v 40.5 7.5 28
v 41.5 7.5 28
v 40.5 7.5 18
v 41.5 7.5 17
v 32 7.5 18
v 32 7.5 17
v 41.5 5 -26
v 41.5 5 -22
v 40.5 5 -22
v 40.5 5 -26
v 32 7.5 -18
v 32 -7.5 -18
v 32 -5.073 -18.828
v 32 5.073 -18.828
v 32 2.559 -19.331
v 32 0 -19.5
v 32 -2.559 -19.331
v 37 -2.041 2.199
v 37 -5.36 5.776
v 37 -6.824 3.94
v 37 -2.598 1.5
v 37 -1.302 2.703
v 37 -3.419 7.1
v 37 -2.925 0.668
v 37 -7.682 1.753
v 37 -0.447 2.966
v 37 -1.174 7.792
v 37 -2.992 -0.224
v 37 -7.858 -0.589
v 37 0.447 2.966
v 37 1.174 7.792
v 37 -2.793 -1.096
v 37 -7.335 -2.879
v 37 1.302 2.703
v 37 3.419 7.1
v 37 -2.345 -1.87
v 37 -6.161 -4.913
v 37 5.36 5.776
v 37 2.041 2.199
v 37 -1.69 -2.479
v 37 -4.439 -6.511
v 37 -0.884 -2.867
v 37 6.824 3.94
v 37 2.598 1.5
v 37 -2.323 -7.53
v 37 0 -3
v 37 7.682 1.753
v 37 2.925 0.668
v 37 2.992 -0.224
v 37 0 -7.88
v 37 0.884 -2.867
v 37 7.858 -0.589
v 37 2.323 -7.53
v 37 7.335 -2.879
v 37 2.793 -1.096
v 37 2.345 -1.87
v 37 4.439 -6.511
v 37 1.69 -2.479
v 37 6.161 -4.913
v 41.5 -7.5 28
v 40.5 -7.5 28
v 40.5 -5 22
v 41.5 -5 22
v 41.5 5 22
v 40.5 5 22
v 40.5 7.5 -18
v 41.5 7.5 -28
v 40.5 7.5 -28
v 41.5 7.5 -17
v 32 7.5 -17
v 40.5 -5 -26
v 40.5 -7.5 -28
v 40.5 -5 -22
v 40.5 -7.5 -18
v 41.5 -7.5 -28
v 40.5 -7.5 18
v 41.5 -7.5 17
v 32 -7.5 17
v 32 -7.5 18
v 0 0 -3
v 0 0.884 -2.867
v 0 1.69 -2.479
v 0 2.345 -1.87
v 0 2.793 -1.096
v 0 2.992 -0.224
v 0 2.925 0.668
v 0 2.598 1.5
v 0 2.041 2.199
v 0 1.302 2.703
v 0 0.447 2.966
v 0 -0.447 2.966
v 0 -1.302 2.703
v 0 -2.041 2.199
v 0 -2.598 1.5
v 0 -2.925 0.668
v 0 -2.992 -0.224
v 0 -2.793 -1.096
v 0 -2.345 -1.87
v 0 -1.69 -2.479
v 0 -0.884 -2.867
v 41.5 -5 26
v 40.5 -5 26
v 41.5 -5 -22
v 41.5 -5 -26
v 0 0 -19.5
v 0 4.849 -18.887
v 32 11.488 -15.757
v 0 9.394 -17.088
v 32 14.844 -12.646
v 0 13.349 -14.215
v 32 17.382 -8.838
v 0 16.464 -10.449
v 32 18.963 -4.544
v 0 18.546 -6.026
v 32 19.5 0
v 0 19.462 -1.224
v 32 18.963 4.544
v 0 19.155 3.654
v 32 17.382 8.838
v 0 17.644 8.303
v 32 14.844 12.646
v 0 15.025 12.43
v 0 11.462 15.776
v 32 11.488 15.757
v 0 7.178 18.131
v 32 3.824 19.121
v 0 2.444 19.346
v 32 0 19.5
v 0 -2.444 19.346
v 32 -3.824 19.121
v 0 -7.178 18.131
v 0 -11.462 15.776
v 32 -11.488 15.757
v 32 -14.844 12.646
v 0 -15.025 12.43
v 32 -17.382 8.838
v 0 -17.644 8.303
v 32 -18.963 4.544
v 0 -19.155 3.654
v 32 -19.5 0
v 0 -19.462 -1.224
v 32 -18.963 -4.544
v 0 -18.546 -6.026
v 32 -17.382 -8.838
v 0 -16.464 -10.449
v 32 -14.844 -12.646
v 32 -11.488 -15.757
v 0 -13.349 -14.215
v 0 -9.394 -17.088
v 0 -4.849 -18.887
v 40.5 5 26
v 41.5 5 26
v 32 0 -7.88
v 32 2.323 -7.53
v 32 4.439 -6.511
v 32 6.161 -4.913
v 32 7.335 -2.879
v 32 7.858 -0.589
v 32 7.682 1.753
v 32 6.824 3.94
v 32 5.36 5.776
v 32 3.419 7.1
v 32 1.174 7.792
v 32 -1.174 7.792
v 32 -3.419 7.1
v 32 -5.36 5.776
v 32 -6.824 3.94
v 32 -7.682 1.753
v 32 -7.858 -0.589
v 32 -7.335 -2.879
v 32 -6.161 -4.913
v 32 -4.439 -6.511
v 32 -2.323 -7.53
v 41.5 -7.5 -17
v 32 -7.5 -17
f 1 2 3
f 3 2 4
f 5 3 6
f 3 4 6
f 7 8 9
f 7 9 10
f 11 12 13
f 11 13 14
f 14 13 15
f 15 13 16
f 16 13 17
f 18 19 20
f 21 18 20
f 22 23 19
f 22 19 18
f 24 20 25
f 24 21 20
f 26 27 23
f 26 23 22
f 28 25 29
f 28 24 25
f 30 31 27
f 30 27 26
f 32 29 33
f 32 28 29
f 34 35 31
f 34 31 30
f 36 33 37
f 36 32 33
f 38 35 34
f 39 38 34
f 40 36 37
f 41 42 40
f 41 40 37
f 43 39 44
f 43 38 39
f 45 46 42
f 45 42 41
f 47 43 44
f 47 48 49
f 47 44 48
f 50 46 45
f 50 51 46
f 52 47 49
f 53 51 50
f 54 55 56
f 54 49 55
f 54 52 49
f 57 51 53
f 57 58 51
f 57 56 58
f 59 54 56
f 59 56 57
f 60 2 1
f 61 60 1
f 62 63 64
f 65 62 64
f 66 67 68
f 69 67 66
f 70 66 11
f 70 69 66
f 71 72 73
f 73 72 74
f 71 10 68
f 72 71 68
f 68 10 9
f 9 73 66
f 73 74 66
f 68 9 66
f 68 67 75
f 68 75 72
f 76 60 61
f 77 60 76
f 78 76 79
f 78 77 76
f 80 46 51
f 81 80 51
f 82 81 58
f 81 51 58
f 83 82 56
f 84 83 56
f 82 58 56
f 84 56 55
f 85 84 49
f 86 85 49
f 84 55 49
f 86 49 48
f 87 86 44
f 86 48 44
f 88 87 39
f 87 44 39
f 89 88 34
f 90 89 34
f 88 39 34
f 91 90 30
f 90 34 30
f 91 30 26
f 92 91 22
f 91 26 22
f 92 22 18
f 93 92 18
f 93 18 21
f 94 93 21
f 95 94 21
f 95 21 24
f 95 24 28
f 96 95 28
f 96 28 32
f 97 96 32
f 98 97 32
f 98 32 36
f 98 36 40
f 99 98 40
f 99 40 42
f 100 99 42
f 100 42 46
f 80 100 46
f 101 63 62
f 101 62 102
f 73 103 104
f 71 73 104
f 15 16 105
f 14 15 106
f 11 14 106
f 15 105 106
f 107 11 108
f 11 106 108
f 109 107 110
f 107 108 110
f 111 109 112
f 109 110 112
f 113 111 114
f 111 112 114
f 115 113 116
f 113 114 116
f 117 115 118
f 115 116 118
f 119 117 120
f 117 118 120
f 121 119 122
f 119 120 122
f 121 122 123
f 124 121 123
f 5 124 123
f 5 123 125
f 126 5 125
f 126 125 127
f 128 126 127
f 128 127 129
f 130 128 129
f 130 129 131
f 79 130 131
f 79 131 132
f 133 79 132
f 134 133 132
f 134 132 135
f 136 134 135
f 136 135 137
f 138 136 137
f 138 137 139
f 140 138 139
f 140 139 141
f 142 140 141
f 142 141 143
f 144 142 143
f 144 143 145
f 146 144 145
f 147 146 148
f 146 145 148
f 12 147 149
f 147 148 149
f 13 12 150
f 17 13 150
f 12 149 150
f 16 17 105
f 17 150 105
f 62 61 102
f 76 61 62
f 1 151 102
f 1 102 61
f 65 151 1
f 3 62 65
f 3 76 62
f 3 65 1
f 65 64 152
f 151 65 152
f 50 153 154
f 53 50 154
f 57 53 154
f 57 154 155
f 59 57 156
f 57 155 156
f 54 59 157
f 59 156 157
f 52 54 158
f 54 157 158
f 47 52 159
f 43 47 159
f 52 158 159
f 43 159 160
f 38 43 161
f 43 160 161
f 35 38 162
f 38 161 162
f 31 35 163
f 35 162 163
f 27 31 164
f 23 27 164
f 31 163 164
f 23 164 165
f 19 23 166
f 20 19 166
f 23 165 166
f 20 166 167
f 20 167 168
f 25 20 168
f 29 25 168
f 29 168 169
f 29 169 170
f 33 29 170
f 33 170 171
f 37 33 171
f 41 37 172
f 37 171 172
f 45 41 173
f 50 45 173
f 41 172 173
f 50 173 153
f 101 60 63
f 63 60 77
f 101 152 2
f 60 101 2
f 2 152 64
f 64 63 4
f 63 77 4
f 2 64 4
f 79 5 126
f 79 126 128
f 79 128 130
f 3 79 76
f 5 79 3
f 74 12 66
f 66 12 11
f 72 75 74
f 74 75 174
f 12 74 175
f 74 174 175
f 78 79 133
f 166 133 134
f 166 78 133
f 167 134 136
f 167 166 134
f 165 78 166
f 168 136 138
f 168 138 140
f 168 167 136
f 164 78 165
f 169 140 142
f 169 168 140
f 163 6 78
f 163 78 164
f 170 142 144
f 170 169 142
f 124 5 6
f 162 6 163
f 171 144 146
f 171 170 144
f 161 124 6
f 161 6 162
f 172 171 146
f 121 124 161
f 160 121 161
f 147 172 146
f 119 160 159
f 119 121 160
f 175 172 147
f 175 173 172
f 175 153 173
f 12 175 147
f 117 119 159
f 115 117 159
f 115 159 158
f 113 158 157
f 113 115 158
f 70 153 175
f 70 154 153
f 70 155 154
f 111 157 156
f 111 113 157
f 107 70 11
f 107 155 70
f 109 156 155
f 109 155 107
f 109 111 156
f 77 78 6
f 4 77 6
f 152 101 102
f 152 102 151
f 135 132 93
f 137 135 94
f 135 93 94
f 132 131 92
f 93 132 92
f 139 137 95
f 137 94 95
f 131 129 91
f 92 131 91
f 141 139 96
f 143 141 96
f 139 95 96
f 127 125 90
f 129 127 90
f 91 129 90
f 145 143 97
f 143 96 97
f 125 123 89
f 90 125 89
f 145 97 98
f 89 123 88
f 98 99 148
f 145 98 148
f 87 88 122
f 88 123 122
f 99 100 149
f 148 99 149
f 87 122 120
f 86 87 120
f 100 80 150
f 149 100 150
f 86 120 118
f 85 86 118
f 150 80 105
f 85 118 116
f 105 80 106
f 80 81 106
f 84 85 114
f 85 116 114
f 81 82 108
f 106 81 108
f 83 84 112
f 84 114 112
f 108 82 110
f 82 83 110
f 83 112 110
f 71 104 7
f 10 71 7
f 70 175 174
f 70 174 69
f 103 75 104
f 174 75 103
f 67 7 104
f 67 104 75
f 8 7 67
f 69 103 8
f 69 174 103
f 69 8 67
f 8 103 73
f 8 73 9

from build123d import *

# Parameters (mm, degrees)
SKETCH_1_R          = 19.5
EXTRUDE_1_DEPTH     = 32
SKETCH_2_R          = 7.88
EXTRUDE_2_DEPTH     = 5
CUT_EXTRUDE_1_REACH = 48.147
SKETCH_3_R          = 3
SKETCH_4_W          = 1
SKETCH_4_H          = 15
EXTRUDE_3_DEPTH     = 9.5
SKETCH_6_W          = 1
SKETCH_6_H          = 15
EXTRUDE_4_DEPTH     = 10
SKETCH_7_W          = 4
SKETCH_7_H          = 10
CUT_EXTRUDE_2_DEPTH = 10


with BuildPart() as part:
    # 草图1 → 凸台-拉伸1 (new body)
    with BuildSketch(Plane(origin=(0, 0, 0), x_dir=(0, 0, -1), z_dir=(1, 0, 0))):
        Circle(SKETCH_1_R)
    extrude(amount=EXTRUDE_1_DEPTH)

    # 草图2 → 凸台-拉伸2 (add)
    with BuildSketch(Plane(origin=(32, 0, 0), x_dir=(0, 0, -1), z_dir=(1, 0, 0))):
        Circle(SKETCH_2_R)
    extrude(amount=EXTRUDE_2_DEPTH)

    # 草图3 → 切除-拉伸1 (cut, up to next)
    with BuildSketch(Plane(origin=(37, 0, 0), x_dir=(0, 0, -1), z_dir=(1, 0, 0)), mode=Mode.PRIVATE) as cut_extrude_1_sk1:
        Circle(SKETCH_3_R)
    cut_extrude_1_tool1 = extrude(cut_extrude_1_sk1.sketch, amount=-CUT_EXTRUDE_1_REACH, mode=Mode.PRIVATE) & part.part
    add(cut_extrude_1_tool1.solids().sort_by_distance((37, 0, 0))[0], mode=Mode.SUBTRACT)

    # 草图4 → 凸台-拉伸3 (add)
    with BuildSketch(Plane(origin=(32, 0, 0), x_dir=(0, 0, -1), z_dir=(1, 0, 0))):
        with Locations((17.5, 0)):
            Rectangle(SKETCH_4_W, SKETCH_4_H)
    extrude_3 = extrude(amount=EXTRUDE_3_DEPTH)

    # 草图6 → 凸台-拉伸4 (add)
    with BuildSketch(Plane(origin=(0, 0, -18), x_dir=(-1, 0, 0), z_dir=(0, 0, -1))):
        with Locations((-41, 0)):
            Rectangle(SKETCH_6_W, SKETCH_6_H)
    extrude_4 = extrude(amount=EXTRUDE_4_DEPTH)

    # 草图7 → 切除-拉伸2 (cut)
    with BuildSketch(Plane(origin=(41.5, 0, 0), x_dir=(0, 0, -1), z_dir=(1, 0, 0))):
        with Locations((24, 0)):
            Rectangle(SKETCH_7_W, SKETCH_7_H)
    cut_extrude_2 = extrude(amount=-CUT_EXTRUDE_2_DEPTH, mode=Mode.SUBTRACT)

    # 镜向1: 凸台-拉伸3, 凸台-拉伸4, 切除-拉伸2 across plane
    add(extrude_3.mirror(Plane.XY))
    add(extrude_4.mirror(Plane.XY))
    add(cut_extrude_2.mirror(Plane.XY), mode=Mode.SUBTRACT)


solid = part.part
